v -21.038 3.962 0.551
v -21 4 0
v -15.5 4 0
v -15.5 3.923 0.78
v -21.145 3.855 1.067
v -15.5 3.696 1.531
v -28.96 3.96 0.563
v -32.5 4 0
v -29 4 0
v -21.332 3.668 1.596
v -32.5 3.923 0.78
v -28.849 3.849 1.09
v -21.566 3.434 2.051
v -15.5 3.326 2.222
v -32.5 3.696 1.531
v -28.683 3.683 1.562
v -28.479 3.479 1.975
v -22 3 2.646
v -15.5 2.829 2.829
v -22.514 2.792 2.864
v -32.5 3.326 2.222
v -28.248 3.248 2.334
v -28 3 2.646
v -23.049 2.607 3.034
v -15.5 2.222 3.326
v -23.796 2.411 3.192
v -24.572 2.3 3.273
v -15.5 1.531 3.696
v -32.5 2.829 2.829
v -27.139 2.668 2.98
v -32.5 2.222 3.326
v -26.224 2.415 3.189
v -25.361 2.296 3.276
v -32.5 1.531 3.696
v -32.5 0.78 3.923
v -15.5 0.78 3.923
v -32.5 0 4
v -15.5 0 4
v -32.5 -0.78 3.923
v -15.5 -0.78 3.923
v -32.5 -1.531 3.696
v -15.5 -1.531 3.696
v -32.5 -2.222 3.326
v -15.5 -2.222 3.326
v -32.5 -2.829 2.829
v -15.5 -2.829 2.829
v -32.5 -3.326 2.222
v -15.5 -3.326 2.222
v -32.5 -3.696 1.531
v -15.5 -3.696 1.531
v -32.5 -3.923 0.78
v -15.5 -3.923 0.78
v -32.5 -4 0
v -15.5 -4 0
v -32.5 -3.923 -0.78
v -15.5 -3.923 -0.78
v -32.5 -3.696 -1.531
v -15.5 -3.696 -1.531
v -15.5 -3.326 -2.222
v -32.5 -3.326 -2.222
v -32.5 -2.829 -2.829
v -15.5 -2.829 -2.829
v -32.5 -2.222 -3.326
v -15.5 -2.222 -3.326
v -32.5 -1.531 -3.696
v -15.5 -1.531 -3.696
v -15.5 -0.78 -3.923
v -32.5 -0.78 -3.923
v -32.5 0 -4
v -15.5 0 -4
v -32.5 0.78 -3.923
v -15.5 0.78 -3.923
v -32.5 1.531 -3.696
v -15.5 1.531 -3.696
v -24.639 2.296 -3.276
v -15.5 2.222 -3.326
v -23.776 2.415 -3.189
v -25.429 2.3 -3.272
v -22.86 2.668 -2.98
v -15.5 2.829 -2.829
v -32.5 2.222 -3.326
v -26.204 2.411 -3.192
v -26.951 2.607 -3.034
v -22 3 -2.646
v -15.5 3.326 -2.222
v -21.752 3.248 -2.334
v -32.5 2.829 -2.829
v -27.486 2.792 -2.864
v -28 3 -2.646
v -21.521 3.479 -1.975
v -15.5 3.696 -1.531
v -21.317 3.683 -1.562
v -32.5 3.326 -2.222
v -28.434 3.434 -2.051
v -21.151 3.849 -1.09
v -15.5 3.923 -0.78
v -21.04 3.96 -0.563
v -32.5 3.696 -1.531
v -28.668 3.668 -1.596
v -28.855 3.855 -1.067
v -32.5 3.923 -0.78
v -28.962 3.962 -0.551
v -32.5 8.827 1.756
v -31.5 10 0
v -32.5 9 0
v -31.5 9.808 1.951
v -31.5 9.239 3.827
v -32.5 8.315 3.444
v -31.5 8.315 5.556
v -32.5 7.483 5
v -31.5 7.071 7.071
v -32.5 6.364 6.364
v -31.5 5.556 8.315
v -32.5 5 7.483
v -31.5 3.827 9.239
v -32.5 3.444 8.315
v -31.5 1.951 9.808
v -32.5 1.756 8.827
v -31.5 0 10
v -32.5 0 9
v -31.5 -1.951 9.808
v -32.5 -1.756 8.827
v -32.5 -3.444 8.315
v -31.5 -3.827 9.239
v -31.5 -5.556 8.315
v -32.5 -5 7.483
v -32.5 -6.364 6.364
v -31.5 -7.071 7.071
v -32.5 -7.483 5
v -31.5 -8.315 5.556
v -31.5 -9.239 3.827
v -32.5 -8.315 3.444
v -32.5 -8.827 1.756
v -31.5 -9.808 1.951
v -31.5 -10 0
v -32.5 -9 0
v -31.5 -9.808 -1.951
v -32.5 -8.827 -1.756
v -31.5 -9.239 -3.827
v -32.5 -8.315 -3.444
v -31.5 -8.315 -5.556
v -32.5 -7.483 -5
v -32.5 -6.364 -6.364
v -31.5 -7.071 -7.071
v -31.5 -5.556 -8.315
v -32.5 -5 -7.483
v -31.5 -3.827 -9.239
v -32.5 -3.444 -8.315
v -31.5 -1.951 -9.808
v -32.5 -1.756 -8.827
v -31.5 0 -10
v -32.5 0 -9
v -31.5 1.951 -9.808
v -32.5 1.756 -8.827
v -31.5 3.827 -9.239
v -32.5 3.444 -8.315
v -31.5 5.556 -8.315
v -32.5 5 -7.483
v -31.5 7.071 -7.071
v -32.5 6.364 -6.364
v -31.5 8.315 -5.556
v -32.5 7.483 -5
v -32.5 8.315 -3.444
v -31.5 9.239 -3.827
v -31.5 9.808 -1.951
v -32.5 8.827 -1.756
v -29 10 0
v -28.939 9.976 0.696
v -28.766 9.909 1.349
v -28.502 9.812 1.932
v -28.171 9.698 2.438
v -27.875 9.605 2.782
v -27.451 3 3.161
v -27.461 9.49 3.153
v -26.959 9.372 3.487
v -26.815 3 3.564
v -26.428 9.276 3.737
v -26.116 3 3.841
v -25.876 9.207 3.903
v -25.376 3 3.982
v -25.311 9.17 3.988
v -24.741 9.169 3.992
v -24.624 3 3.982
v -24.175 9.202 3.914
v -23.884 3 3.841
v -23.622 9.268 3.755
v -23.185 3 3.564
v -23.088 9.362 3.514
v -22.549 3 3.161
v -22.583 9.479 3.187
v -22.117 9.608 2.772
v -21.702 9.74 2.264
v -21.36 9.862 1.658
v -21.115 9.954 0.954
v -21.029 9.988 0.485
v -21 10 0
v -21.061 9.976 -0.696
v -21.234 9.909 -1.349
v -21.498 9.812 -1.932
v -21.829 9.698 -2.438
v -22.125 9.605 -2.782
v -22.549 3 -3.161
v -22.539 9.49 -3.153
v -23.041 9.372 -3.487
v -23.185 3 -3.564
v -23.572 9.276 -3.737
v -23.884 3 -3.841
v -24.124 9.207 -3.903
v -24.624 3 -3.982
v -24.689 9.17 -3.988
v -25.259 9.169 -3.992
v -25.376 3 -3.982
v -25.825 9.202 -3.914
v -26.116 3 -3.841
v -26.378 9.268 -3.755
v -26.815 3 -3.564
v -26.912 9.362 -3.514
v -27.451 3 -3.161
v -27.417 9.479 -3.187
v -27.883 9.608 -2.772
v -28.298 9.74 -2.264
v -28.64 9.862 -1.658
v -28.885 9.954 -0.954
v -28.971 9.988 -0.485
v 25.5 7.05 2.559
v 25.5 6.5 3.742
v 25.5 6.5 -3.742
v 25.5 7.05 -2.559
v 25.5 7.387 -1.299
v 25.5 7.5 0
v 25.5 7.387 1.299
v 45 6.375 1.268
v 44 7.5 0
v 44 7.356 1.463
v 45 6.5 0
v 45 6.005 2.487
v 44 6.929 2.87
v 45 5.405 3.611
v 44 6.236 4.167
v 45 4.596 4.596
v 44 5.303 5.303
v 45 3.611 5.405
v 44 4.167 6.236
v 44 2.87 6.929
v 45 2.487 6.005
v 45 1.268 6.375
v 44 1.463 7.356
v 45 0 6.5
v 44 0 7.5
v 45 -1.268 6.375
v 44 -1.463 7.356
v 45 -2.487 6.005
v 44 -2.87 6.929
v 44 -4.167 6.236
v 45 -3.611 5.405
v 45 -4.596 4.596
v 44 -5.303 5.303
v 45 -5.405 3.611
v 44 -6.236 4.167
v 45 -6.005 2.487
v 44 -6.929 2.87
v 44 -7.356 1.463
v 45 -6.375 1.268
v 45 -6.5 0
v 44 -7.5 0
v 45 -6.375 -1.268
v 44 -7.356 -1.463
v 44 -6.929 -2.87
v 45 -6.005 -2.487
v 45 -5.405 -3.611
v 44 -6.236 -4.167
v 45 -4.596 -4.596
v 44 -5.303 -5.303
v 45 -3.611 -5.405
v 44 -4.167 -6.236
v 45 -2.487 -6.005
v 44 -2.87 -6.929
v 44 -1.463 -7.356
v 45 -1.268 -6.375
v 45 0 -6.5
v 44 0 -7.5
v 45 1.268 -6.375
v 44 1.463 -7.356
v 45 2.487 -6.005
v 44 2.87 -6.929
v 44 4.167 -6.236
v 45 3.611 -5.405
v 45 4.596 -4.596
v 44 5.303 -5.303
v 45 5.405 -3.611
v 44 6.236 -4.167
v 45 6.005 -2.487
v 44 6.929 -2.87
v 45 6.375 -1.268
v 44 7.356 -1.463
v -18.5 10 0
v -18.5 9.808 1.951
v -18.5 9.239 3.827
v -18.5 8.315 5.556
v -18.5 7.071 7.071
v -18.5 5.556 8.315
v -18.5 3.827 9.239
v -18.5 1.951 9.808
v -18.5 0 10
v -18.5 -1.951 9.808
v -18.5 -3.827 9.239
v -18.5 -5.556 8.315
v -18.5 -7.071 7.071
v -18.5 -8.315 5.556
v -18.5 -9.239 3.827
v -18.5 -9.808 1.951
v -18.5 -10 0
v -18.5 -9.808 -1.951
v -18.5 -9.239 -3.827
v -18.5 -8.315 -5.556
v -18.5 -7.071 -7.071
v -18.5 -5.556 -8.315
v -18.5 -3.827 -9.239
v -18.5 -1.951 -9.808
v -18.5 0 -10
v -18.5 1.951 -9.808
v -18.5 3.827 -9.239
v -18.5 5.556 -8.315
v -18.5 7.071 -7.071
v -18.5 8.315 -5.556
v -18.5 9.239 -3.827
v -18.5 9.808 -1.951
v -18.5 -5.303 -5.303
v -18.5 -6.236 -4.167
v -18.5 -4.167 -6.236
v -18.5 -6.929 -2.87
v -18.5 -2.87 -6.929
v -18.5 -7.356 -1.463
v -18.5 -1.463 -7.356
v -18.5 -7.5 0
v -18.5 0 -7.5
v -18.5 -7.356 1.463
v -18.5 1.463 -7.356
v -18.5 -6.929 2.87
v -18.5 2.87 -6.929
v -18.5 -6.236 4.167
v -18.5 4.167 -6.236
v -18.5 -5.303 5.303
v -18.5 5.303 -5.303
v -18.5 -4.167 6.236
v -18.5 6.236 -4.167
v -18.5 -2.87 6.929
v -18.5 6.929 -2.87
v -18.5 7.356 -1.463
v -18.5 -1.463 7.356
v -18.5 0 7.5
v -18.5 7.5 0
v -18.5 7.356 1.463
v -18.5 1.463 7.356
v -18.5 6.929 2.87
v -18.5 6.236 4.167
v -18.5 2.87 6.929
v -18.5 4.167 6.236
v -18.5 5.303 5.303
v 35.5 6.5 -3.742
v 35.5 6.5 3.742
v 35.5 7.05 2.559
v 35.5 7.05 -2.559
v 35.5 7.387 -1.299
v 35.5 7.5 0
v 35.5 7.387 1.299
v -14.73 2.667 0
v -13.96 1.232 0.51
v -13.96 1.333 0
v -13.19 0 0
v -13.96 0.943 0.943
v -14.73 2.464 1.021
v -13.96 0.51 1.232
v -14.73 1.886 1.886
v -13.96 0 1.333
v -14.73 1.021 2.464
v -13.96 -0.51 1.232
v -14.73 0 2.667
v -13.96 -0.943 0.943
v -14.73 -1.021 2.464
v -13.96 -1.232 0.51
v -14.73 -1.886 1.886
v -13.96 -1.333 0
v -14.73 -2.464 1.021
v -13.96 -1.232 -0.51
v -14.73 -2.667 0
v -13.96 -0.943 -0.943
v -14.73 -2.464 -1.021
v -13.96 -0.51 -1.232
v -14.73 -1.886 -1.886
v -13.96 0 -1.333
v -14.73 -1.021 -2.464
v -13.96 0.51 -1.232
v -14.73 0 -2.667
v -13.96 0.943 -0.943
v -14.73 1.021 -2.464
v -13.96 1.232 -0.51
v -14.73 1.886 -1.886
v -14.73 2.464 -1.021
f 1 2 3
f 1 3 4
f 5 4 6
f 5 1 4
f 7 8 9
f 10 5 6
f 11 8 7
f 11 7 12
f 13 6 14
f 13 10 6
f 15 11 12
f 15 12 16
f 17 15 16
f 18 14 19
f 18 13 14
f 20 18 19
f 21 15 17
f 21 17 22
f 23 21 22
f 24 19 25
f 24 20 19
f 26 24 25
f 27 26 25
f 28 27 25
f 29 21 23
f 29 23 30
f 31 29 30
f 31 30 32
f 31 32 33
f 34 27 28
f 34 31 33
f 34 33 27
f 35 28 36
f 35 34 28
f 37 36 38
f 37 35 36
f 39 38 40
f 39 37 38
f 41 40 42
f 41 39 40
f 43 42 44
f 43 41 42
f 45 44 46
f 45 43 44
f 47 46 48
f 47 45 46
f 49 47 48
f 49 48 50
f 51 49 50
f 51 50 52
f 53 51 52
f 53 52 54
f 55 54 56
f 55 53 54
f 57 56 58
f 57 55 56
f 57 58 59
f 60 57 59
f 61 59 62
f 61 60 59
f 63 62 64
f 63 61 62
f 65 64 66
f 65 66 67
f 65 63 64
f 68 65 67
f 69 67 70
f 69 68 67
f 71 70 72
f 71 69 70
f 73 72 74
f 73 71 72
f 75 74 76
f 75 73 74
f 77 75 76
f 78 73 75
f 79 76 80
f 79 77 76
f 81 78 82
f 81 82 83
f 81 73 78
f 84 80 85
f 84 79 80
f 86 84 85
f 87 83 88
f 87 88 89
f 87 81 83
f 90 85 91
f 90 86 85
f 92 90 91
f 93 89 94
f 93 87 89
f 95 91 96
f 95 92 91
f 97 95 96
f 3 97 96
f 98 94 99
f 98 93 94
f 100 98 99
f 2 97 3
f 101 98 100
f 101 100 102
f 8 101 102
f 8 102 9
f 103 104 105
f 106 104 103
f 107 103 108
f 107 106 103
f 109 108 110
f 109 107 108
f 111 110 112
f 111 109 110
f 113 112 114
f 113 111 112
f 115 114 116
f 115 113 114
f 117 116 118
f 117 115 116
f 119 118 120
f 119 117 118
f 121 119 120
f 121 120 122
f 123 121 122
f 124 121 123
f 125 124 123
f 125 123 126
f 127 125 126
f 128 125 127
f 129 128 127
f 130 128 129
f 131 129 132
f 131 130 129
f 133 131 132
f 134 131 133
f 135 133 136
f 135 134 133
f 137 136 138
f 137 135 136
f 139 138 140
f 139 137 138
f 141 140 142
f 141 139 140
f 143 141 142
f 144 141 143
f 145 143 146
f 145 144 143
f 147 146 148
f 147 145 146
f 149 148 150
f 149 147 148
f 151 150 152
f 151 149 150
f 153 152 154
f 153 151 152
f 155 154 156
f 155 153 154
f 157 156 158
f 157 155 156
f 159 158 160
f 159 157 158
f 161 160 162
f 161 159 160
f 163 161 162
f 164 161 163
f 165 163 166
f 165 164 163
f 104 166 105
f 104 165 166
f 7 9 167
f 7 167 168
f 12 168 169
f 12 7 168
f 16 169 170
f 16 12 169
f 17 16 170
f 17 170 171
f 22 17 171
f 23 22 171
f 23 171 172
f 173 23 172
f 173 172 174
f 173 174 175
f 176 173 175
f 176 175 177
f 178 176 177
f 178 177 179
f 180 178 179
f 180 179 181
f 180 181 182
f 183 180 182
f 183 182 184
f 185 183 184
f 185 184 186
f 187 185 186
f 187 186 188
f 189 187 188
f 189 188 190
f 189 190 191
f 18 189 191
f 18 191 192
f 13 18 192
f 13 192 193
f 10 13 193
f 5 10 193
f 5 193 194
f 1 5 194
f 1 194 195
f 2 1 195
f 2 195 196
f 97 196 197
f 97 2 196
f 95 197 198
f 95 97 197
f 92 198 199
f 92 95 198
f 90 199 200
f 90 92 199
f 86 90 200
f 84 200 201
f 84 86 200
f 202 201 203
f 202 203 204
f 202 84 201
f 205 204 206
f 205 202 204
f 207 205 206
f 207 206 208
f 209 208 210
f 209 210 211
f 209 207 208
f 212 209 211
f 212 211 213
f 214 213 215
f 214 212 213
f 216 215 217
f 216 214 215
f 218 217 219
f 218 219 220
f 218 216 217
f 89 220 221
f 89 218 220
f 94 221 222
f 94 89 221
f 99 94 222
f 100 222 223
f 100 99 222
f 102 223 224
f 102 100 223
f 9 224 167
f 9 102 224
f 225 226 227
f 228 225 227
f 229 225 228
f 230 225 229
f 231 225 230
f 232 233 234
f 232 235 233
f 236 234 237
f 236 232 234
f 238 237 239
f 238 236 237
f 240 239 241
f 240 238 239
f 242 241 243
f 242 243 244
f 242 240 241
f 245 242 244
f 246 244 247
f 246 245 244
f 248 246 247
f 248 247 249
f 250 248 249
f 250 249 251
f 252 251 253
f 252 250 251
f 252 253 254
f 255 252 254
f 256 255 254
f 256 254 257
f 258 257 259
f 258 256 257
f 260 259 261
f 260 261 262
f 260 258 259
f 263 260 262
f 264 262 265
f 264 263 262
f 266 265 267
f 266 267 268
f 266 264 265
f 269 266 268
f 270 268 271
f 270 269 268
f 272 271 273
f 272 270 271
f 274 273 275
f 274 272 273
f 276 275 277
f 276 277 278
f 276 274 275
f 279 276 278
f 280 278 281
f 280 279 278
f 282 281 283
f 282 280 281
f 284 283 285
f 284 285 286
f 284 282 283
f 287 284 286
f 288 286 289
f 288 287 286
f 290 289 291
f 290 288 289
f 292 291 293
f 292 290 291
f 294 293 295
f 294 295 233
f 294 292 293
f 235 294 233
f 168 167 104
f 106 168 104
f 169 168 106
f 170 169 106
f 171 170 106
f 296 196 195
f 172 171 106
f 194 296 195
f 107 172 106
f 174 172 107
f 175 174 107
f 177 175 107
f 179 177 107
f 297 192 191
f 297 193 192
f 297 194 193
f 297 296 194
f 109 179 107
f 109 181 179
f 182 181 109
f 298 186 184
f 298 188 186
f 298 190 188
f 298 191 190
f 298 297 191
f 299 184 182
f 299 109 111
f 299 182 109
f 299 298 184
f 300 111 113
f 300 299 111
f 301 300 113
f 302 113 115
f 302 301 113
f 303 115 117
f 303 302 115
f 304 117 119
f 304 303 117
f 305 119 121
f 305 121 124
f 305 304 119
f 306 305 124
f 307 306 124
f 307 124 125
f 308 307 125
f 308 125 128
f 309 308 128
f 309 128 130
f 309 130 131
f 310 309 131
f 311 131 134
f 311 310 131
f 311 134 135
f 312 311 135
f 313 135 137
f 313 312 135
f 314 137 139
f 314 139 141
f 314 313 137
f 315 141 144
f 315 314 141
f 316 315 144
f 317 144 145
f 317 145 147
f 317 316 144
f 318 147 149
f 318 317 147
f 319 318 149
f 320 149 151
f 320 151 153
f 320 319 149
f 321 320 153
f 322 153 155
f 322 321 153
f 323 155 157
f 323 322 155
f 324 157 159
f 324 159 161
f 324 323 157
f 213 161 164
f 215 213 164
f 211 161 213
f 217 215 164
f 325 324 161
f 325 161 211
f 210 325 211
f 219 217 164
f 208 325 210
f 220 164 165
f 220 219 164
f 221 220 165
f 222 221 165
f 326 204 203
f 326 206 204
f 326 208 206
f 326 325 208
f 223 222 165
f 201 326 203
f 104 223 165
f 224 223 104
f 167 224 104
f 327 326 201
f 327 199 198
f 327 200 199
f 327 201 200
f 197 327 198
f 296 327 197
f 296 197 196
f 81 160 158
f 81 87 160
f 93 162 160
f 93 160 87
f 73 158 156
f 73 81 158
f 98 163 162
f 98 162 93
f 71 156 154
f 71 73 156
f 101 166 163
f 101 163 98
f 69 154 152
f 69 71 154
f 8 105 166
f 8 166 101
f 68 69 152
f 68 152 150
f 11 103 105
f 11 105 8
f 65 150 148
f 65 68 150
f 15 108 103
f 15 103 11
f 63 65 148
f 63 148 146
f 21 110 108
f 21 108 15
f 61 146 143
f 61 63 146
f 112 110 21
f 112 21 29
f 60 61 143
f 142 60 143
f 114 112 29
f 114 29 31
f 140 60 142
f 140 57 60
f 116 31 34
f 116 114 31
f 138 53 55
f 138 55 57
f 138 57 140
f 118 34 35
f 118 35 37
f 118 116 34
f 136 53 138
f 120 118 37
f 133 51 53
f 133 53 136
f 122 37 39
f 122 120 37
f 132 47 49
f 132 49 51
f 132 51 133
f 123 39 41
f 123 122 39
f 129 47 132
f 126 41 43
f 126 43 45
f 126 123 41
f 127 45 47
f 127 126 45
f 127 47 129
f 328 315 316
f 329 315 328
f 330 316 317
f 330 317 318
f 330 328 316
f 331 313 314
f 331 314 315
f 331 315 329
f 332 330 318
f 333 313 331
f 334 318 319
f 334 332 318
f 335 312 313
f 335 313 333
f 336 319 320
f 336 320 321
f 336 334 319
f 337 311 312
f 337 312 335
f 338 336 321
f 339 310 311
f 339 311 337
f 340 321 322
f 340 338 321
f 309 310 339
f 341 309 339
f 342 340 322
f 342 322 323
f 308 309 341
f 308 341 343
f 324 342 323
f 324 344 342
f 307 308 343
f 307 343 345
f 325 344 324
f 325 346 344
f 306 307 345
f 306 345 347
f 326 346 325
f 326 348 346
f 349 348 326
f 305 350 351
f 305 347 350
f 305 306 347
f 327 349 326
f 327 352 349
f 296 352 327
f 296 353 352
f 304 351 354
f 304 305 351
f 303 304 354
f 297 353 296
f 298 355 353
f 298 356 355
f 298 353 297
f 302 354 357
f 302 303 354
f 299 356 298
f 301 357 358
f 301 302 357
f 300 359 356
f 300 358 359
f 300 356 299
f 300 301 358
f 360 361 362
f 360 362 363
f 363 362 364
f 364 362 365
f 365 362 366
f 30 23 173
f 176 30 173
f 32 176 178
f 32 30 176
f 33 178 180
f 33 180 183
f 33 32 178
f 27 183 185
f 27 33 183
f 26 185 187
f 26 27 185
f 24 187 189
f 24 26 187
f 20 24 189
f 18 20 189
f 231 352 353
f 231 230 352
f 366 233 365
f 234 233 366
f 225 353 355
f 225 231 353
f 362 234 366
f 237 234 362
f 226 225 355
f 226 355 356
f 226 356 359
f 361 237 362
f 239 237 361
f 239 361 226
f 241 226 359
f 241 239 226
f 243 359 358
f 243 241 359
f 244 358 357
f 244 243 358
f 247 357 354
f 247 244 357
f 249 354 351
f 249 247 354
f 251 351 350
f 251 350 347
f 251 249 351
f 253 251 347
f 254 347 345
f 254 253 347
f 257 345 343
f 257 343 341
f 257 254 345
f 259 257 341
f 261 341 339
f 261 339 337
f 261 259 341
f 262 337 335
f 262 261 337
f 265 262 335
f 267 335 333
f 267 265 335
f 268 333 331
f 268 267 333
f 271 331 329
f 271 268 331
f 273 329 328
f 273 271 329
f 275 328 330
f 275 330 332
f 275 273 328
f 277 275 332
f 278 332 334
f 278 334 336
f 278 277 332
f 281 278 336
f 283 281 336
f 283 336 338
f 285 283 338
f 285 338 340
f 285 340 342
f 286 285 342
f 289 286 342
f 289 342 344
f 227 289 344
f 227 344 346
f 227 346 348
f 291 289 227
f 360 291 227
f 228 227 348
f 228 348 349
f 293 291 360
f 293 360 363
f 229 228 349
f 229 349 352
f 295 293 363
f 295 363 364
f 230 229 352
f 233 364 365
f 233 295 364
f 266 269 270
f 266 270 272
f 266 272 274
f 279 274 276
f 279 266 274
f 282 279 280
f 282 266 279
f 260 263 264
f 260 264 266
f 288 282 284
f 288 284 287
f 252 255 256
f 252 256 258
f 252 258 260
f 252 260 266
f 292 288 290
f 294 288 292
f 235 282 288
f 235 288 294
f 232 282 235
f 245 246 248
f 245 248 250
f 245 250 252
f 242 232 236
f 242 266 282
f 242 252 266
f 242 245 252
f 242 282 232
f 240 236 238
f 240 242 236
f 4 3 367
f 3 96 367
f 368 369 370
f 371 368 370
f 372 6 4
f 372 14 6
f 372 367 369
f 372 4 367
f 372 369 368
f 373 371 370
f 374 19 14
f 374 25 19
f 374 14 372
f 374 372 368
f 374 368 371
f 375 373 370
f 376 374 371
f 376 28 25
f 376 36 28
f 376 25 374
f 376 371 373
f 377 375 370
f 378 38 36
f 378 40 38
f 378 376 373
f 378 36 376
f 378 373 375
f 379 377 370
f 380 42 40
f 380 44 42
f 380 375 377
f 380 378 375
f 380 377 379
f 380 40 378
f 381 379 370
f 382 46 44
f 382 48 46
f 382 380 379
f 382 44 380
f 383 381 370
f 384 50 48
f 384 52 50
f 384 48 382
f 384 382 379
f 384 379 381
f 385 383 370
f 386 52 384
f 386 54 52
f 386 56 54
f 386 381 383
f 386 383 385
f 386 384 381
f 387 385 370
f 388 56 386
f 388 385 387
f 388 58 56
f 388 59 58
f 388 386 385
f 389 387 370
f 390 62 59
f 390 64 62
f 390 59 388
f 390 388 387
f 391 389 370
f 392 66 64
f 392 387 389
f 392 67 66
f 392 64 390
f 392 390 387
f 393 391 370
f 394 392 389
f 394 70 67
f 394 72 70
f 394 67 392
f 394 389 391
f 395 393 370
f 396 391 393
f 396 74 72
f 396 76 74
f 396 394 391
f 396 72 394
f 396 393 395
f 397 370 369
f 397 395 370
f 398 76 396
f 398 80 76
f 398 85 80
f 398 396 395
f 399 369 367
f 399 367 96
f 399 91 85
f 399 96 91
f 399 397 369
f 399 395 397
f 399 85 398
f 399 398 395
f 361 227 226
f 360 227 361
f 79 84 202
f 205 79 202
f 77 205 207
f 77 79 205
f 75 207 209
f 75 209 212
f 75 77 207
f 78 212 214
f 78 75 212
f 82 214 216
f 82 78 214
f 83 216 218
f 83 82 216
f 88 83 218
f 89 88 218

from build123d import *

# Parameters (mm, degrees)
ENL_V_MAT_EXTRU_3_DEPTH      = 4
ENL_V_MAT_EXTRU_3_DEPTH_BACK = 4
ESQUISSE6_W                  = 10
ESQUISSE6_H                  = 1


with BuildPart() as part:
    # Esquisse1 → Révolution5 (revolve)
    with BuildSketch(Plane.XY):
        Polygon((-18.5, 7.5), (44, 7.5), (45, 6.5), (45, 0), (-13.190313779, 0), (-15.499848989, 4.000151011), (-32.499848989, 4.000151011), (-32.499848989, 9.000151011), (-31.5, 10), (-18.5, 10), align=None)
    revolve(axis=Axis((-1000, 0, 0), (1, 0, 0)))

    # Esquisse5 → Enlèvement de matière-Révolution1 (revolve, cut)
    with BuildSketch(Plane.XY):
        Polygon((-29, 10), (-29, 3), (-27.75, 1.75), (-25, 1.75), (-25, 10), align=None)
    revolve(axis=Axis((-25, 1.75, 0), (0, 1, 0)), mode=Mode.SUBTRACT)

    # Esquisse6 → Enlèv. mat.-Extru.3 (cut, two sides: drawn at the far end of the back side and taken through both)
    with BuildSketch(Plane.XY.offset(-ENL_V_MAT_EXTRU_3_DEPTH_BACK)):
        with Locations((30.5, 7)):
            Rectangle(ESQUISSE6_W, ESQUISSE6_H)
    extrude(amount=ENL_V_MAT_EXTRU_3_DEPTH + ENL_V_MAT_EXTRU_3_DEPTH_BACK, mode=Mode.SUBTRACT)


solid = part.part
